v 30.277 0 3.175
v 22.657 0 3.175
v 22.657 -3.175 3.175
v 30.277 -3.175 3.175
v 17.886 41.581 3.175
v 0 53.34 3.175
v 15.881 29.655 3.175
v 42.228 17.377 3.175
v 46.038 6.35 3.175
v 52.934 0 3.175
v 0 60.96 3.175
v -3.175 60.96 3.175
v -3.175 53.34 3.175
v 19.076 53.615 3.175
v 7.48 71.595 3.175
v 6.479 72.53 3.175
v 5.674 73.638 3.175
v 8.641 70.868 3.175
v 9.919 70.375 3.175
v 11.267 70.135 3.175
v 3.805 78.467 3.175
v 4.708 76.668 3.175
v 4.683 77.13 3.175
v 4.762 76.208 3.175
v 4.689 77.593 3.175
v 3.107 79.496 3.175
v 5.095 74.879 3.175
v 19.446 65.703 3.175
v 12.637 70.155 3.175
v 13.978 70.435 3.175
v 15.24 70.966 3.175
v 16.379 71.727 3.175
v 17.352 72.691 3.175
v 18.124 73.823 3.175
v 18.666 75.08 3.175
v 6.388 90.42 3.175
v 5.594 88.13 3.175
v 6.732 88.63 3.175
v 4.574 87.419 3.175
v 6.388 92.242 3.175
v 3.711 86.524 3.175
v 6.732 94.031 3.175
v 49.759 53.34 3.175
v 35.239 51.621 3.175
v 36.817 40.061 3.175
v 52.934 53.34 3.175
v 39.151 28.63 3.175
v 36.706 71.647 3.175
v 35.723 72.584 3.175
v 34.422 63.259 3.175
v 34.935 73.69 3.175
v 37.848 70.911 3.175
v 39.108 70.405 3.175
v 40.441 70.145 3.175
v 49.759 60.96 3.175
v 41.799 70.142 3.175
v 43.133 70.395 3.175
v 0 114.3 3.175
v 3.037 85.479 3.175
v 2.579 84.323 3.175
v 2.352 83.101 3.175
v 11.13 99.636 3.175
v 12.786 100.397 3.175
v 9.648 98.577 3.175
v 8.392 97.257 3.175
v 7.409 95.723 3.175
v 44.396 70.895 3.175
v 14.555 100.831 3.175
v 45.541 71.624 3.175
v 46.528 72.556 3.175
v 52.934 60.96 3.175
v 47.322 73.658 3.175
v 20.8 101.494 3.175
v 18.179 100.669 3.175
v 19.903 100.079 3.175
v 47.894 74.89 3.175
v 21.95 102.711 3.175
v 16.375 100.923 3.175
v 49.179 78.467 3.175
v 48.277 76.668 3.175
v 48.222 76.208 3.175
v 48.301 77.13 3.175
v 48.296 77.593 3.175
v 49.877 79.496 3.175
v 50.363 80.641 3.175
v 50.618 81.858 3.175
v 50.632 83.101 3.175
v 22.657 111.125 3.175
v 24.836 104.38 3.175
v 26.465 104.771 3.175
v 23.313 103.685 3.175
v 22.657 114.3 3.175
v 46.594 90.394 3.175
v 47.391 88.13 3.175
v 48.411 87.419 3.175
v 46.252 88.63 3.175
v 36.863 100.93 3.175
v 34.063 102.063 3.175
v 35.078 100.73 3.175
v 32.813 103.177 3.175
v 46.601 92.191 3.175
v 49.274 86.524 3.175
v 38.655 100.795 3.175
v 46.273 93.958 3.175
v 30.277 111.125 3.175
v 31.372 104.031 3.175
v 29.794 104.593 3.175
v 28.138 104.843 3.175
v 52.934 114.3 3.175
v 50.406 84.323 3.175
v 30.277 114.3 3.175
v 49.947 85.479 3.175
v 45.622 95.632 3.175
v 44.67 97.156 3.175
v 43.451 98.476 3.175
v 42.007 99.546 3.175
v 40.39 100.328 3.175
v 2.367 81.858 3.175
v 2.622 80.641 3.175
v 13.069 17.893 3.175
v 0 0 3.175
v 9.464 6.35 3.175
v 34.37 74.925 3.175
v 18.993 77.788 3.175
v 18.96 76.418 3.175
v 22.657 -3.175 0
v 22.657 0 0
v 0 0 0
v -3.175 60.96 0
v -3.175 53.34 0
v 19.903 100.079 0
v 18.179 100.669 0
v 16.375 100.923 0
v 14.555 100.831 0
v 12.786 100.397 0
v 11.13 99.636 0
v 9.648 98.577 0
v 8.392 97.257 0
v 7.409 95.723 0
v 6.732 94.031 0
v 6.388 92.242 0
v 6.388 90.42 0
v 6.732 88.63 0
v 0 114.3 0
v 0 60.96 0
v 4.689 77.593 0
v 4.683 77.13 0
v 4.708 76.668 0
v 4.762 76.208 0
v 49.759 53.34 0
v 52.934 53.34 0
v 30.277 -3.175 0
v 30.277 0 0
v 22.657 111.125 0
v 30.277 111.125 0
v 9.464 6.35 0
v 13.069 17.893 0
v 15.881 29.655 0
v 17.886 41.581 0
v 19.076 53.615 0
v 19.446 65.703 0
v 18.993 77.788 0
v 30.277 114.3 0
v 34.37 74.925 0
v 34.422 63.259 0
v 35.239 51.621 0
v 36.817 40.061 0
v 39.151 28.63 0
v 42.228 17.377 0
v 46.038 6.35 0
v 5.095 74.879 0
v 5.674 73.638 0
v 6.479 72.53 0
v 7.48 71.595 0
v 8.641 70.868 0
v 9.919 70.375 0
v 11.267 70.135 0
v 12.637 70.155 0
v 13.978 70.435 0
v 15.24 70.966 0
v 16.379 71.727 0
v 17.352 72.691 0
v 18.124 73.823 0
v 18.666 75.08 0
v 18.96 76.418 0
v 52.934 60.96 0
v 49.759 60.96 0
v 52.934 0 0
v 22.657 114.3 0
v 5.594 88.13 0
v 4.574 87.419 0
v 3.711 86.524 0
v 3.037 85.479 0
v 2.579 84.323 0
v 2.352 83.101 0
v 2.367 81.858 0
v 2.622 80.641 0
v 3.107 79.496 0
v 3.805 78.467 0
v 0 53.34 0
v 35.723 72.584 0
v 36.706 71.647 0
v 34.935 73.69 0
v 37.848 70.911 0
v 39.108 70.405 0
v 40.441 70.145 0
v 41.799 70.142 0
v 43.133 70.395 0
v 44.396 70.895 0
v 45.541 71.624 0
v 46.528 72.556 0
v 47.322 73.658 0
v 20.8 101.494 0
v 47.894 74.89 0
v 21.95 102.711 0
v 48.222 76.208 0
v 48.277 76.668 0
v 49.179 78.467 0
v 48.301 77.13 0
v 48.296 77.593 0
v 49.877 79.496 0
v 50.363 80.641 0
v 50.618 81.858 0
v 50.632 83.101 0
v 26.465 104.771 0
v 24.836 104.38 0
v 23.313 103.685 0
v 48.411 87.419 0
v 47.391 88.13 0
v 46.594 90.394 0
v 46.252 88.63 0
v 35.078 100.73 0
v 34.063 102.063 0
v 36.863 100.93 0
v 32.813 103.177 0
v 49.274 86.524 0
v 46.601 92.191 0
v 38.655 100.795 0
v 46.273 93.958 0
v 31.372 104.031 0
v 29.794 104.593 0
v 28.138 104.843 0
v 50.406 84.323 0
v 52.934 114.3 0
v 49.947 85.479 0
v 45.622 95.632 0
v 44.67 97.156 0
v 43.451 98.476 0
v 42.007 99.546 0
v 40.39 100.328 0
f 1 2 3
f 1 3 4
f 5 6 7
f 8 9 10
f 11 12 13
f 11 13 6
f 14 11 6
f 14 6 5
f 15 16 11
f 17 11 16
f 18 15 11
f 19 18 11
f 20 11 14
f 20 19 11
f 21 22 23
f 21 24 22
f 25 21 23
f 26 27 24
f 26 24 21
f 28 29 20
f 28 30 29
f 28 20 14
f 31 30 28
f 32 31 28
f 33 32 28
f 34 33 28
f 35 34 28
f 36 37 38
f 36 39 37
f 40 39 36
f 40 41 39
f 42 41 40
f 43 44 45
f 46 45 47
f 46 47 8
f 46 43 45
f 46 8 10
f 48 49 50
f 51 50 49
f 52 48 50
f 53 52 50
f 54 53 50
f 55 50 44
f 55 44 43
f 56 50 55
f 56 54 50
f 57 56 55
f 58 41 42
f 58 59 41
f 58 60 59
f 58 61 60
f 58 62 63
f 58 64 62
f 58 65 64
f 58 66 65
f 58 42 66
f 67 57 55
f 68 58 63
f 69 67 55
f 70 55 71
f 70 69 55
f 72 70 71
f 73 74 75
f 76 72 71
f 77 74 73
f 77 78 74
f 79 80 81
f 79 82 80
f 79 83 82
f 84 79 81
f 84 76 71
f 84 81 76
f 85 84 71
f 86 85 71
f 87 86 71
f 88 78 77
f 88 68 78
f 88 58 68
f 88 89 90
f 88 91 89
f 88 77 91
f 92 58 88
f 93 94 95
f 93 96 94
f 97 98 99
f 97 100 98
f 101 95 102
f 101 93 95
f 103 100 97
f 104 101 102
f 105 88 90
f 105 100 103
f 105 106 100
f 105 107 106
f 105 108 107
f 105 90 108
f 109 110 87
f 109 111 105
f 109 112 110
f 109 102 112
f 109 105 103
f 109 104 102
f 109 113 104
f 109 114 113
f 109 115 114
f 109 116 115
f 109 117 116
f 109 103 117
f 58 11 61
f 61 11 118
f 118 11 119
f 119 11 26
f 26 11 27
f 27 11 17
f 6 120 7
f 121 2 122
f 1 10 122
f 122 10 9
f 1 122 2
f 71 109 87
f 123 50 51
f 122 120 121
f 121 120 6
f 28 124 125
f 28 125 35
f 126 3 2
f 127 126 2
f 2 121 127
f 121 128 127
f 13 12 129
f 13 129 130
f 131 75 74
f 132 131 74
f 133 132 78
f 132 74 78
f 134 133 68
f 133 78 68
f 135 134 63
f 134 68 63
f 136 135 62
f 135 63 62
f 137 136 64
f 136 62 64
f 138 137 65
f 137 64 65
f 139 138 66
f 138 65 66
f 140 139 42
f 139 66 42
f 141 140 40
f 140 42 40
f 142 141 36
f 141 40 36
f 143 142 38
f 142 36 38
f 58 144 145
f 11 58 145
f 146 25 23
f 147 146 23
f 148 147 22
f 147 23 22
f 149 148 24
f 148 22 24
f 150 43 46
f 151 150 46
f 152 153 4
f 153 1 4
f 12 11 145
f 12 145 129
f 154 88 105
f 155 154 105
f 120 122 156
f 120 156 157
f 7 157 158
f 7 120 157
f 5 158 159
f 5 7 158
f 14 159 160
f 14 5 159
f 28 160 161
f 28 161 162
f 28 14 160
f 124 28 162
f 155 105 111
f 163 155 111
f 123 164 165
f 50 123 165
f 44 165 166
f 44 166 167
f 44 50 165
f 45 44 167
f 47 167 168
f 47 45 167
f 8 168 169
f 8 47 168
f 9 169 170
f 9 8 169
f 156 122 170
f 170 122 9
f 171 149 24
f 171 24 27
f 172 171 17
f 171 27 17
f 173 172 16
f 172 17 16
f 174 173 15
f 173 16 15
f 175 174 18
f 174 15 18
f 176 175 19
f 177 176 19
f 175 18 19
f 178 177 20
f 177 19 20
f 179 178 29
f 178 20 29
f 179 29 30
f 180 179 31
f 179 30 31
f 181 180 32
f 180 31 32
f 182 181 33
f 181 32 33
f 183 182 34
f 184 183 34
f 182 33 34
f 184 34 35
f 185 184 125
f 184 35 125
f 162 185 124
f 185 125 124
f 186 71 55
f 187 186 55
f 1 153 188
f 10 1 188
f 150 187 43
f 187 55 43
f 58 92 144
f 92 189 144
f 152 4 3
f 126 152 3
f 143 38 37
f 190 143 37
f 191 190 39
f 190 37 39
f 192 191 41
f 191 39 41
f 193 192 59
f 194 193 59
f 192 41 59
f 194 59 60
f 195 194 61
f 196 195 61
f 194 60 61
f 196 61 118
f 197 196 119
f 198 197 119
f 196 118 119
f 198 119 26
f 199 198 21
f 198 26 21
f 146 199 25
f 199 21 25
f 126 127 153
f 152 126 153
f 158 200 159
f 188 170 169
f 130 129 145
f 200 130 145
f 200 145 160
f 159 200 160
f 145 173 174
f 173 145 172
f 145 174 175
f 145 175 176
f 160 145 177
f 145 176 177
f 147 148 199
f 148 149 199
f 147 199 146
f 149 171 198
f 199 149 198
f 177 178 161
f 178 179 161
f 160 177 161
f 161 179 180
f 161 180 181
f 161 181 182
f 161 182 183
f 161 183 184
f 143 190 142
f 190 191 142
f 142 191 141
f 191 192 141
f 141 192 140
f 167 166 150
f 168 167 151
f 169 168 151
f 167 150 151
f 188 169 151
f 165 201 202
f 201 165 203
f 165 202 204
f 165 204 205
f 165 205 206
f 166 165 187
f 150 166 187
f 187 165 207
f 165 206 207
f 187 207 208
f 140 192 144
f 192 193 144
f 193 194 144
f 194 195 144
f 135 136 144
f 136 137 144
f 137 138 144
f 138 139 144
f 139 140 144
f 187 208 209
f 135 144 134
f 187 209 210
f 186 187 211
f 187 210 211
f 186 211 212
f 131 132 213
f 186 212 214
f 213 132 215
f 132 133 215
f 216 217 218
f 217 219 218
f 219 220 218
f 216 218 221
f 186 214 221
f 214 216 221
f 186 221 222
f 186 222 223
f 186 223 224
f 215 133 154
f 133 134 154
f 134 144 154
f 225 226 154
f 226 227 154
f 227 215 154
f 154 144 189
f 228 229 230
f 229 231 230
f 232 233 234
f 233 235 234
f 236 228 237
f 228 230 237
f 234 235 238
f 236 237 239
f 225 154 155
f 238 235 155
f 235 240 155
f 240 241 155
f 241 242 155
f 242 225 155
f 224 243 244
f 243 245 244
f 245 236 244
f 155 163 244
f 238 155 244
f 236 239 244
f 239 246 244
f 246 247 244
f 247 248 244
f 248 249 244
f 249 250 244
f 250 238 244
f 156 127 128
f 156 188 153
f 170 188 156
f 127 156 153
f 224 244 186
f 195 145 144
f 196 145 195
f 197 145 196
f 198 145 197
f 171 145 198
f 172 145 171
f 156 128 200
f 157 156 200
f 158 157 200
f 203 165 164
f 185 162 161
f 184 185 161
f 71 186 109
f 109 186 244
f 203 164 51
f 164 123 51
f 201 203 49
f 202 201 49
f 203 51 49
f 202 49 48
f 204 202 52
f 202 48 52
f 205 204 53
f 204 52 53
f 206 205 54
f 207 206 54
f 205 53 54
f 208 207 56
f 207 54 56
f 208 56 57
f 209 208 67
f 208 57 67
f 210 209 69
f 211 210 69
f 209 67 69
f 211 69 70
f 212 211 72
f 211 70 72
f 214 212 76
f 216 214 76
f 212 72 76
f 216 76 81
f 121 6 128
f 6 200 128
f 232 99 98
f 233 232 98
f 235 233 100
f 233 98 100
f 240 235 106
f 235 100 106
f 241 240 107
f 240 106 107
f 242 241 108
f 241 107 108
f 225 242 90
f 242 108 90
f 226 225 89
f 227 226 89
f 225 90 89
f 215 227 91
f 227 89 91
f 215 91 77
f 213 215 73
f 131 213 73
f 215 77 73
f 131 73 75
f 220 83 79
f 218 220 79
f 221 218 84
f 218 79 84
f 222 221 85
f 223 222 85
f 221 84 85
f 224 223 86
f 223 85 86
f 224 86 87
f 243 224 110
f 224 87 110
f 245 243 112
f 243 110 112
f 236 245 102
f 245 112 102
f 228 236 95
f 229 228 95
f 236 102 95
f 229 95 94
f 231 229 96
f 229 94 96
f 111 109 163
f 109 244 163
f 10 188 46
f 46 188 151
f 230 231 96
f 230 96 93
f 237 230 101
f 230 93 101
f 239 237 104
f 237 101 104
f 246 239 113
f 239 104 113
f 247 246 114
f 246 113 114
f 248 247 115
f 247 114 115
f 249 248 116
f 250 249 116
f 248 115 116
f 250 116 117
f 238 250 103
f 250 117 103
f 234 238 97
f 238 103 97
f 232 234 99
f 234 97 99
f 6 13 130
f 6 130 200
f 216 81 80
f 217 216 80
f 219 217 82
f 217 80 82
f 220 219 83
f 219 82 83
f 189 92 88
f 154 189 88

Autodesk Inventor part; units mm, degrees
ref_plane "YZ Plane" through (0, 0, 0) normal (1, 0, 0) x (0, 1, 0)
ref_plane "XZ Plane" through (0, 0, 0) normal (0, 1, 0) x (-1, 0, 0)
ref_plane "XY Plane" through (0, 0, 0) normal (0, 0, 1) x (1, 0, 0)
sketch "Sketch1" plane through (0, 0, 0) normal (0, 0, 1) x (1, 0, 0)
  line L0 (0, 0) -> (52.9336, 0)
  line L1 (52.9336, 0) -> (52.9336, 114.3)
  line L2 (52.9336, 114.3) -> (0, 114.3)
  line L3 (0, 114.3) -> (0, 0)
  dimension "d0" = 114.3
  dimension "d1" = 52.9336
extrude "Extrusion1" add sketch "Sketch1" along normal blind 3.175
sketch "Sketch2" plane through (0, 0, 3.175) normal (0, 0, 1) x (1, 0, 0)
  line L0 (0, 114.3) -> (0, 0) projected
  line L1 (52.9336, 0) -> (52.9336, 114.3) projected
  line L2 (0, 60.96) -> (-3.175, 60.96)
  line L3 (-3.175, 60.96) -> (-3.175, 53.34)
  line L4 (-3.175, 53.34) -> (0, 53.34)
  line L5 (0, 53.34) -> (0, 60.96)
  line L6 (52.9336, 60.96) -> (49.7586, 60.96)
  line L7 (49.7586, 60.96) -> (49.7586, 53.34)
  line L8 (49.7586, 53.34) -> (52.9336, 53.34)
  line L9 (52.9336, 53.34) -> (52.9336, 60.96)
  line L10 (52.9336, 114.3) -> (0, 114.3) projected
  line L11 (0, 0) -> (52.9336, 0) projected
  line L12 (30.2768, 114.3) -> (22.6568, 114.3)
  line L13 (30.2768, 0) -> (30.2768, -3.175)
  line L14 (30.2768, -3.175) -> (22.6568, -3.175)
  line L15 (22.6568, -3.175) -> (22.6568, 0)
  line L16 (22.6568, 0) -> (30.2768, 0)
  line L17 (22.6568, 114.3) -> (22.6568, 111.125)
  line L18 (22.6568, 111.125) -> (30.2768, 111.125)
  line L19 (30.2768, 111.125) -> (30.2768, 114.3)
  point P0 (0, 57.15)
  point P1 (52.9336, 57.15)
  point P2 (26.4668, 114.3)
  point P3 (26.4668, 0)
  dimension "d4" = 3.81
  dimension "d5" = 7.62
  dimension "d6" = 3.175
  dimension "d7" = 3.81
  dimension "d8" = 7.62
  dimension "d9" = 3.175
  dimension "d13" = 7.62
  dimension "d14" = 3.81
  dimension "d15" = 3.175
  dimension "d20" = 7.62
  dimension "d21" = 3.81
  dimension "d22" = 3.175
extrude "Extrusion2" add sketch "Sketch2" against normal blind 3.175 contours L0 L4 L3 L2 | L10 L19 L18 L17 | L11 L13 L14 L15 | L1 L8 L7 L6
extrude "Extrusion3" cut sketch "Sketch2" against normal blind 3.175 contours L10 L19 L18 L17 | L1 L8 L7 L6
sketch "Sketch3" plane through (0, 0, 3.175) normal (0, 0, 1) x (1, 0, 0)
  line L0 (0, 60.96) -> (0, 114.3)
  line L1 (22.6568, 114.3) -> (0, 114.3) projected
  line L2 (0, 114.3) -> (22.6568, 114.3)
  line L3 (22.6568, 114.3) -> (22.6568, 111.125)
  line L4 (22.6568, 111.125) -> (30.2768, 111.125)
  line L5 (30.2768, 111.125) -> (22.6568, 111.125) projected
  line L6 (30.2768, 111.125) -> (30.2768, 114.3)
  line L7 (30.2768, 114.3) -> (52.9336, 114.3)
  line L8 (52.9336, 114.3) -> (52.9336, 60.96)
  line L9 (52.9336, 60.96) -> (52.9336, 114.3) projected
  line L10 (52.9336, 60.96) -> (49.7586, 60.96)
  line L11 (49.7586, 60.96) -> (49.7586, 53.34)
  line L12 (49.7586, 60.96) -> (49.7586, 53.34) projected
  line L13 (49.7586, 53.34) -> (52.9336, 53.34)
  line L14 (52.9336, 53.34) -> (52.9336, 0)
  line L15 (52.9336, 0) -> (52.9336, 53.34) projected
  line L16 (52.9336, 0) -> (30.2768, 0)
  line L17 (0, 0) -> (22.6568, 0) projected
  line L18 (30.2768, 0) -> (30.2768, -3.175)
  line L19 (30.2768, -3.175) -> (22.6568, -3.175)
  line L20 (22.6568, -3.175) -> (30.2768, -3.175) projected
  line L21 (22.6568, -3.175) -> (22.6568, 0)
  line L22 (22.6568, 0) -> (0, 0)
  line L23 (0, 0) -> (0, 53.34)
  line L24 (0, 53.34) -> (0, 0) projected
  line L25 (0, 53.34) -> (-3.175, 53.34)
  line L26 (-3.175, 53.34) -> (-3.175, 60.96)
  line L27 (-3.175, 60.96) -> (-3.175, 53.34) projected
  line L28 (-3.175, 60.96) -> (0, 60.96)
sketch "Sketch4" plane through (0, 0, 3.175) normal (0, 0, 1) x (1, 0, 0)
  arc A0 (9.4645, 6.35) -> (18.9927, 77.7875) centre (-158.3531, 65.0875) ccw
  arc A1 (34.4743, 77.7875) -> (46.0375, 6.35) centre (212.0985, 69.884) ccw
  line L0 (0, 0) -> (22.6568, 0) projected
  line L1 (30.2768, 0) -> (52.9336, 0) projected
  line L2 (9.4645, 6.35) -> (46.0375, 6.35)
  arc A2 (4.7619, 76.2078) -> (18.9927, 77.7875) centre (11.8465, 77.2757) ccw
  arc A3 (6.7319, 88.6305) -> (4.6889, 77.5927) centre (8.7235, 82.5539) ccw
  arc A4 (4.6889, 77.5927) -> (4.7619, 76.2078) centre (11.8465, 77.2757) ccw
  arc A5 (19.9033, 100.0791) -> (6.7319, 88.6305) centre (15.9469, 91.3299) ccw
  line L3 (26.4922, 114.3) -> (26.4922, 47.625) construction
  line L4 (52.9336, 60.96) -> (52.9336, 114.3) projected
  arc A6 (34.37, 74.925) -> (48.2225, 76.2078) centre (41.1379, 77.2757) ccw
  arc A7 (48.2955, 77.5927) -> (46.2525, 88.6305) centre (44.2609, 82.5539) ccw
  arc A8 (48.2225, 76.2078) -> (48.2955, 77.5927) centre (41.1379, 77.2757) ccw
  arc A9 (46.2525, 88.6305) -> (35.0777, 100.7299) centre (37.0375, 91.3299) ccw
  arc A10 (35.0777, 100.7299) -> (19.9033, 100.0791) centre (27.6731, 96.1477) ccw
  point P0 (21.8385, 98.9122)
  point P1 (33.9917, 77.7875)
  point P2 (31.1459, 98.9122)
  dimension "d23" = 71.4375
  dimension "d24" = 6.35
  dimension "d25" = 177.8
  dimension "d26" = 6.35
  dimension "d28" = 177.8
  dimension "d29" = 26.4414
  dimension "d30" = 71.4375
extrude "Extrusion4" cut sketch "Sketch4" against normal blind 25.4
properties part number "Birdhouse Wall" material "Wood (Birch)"
